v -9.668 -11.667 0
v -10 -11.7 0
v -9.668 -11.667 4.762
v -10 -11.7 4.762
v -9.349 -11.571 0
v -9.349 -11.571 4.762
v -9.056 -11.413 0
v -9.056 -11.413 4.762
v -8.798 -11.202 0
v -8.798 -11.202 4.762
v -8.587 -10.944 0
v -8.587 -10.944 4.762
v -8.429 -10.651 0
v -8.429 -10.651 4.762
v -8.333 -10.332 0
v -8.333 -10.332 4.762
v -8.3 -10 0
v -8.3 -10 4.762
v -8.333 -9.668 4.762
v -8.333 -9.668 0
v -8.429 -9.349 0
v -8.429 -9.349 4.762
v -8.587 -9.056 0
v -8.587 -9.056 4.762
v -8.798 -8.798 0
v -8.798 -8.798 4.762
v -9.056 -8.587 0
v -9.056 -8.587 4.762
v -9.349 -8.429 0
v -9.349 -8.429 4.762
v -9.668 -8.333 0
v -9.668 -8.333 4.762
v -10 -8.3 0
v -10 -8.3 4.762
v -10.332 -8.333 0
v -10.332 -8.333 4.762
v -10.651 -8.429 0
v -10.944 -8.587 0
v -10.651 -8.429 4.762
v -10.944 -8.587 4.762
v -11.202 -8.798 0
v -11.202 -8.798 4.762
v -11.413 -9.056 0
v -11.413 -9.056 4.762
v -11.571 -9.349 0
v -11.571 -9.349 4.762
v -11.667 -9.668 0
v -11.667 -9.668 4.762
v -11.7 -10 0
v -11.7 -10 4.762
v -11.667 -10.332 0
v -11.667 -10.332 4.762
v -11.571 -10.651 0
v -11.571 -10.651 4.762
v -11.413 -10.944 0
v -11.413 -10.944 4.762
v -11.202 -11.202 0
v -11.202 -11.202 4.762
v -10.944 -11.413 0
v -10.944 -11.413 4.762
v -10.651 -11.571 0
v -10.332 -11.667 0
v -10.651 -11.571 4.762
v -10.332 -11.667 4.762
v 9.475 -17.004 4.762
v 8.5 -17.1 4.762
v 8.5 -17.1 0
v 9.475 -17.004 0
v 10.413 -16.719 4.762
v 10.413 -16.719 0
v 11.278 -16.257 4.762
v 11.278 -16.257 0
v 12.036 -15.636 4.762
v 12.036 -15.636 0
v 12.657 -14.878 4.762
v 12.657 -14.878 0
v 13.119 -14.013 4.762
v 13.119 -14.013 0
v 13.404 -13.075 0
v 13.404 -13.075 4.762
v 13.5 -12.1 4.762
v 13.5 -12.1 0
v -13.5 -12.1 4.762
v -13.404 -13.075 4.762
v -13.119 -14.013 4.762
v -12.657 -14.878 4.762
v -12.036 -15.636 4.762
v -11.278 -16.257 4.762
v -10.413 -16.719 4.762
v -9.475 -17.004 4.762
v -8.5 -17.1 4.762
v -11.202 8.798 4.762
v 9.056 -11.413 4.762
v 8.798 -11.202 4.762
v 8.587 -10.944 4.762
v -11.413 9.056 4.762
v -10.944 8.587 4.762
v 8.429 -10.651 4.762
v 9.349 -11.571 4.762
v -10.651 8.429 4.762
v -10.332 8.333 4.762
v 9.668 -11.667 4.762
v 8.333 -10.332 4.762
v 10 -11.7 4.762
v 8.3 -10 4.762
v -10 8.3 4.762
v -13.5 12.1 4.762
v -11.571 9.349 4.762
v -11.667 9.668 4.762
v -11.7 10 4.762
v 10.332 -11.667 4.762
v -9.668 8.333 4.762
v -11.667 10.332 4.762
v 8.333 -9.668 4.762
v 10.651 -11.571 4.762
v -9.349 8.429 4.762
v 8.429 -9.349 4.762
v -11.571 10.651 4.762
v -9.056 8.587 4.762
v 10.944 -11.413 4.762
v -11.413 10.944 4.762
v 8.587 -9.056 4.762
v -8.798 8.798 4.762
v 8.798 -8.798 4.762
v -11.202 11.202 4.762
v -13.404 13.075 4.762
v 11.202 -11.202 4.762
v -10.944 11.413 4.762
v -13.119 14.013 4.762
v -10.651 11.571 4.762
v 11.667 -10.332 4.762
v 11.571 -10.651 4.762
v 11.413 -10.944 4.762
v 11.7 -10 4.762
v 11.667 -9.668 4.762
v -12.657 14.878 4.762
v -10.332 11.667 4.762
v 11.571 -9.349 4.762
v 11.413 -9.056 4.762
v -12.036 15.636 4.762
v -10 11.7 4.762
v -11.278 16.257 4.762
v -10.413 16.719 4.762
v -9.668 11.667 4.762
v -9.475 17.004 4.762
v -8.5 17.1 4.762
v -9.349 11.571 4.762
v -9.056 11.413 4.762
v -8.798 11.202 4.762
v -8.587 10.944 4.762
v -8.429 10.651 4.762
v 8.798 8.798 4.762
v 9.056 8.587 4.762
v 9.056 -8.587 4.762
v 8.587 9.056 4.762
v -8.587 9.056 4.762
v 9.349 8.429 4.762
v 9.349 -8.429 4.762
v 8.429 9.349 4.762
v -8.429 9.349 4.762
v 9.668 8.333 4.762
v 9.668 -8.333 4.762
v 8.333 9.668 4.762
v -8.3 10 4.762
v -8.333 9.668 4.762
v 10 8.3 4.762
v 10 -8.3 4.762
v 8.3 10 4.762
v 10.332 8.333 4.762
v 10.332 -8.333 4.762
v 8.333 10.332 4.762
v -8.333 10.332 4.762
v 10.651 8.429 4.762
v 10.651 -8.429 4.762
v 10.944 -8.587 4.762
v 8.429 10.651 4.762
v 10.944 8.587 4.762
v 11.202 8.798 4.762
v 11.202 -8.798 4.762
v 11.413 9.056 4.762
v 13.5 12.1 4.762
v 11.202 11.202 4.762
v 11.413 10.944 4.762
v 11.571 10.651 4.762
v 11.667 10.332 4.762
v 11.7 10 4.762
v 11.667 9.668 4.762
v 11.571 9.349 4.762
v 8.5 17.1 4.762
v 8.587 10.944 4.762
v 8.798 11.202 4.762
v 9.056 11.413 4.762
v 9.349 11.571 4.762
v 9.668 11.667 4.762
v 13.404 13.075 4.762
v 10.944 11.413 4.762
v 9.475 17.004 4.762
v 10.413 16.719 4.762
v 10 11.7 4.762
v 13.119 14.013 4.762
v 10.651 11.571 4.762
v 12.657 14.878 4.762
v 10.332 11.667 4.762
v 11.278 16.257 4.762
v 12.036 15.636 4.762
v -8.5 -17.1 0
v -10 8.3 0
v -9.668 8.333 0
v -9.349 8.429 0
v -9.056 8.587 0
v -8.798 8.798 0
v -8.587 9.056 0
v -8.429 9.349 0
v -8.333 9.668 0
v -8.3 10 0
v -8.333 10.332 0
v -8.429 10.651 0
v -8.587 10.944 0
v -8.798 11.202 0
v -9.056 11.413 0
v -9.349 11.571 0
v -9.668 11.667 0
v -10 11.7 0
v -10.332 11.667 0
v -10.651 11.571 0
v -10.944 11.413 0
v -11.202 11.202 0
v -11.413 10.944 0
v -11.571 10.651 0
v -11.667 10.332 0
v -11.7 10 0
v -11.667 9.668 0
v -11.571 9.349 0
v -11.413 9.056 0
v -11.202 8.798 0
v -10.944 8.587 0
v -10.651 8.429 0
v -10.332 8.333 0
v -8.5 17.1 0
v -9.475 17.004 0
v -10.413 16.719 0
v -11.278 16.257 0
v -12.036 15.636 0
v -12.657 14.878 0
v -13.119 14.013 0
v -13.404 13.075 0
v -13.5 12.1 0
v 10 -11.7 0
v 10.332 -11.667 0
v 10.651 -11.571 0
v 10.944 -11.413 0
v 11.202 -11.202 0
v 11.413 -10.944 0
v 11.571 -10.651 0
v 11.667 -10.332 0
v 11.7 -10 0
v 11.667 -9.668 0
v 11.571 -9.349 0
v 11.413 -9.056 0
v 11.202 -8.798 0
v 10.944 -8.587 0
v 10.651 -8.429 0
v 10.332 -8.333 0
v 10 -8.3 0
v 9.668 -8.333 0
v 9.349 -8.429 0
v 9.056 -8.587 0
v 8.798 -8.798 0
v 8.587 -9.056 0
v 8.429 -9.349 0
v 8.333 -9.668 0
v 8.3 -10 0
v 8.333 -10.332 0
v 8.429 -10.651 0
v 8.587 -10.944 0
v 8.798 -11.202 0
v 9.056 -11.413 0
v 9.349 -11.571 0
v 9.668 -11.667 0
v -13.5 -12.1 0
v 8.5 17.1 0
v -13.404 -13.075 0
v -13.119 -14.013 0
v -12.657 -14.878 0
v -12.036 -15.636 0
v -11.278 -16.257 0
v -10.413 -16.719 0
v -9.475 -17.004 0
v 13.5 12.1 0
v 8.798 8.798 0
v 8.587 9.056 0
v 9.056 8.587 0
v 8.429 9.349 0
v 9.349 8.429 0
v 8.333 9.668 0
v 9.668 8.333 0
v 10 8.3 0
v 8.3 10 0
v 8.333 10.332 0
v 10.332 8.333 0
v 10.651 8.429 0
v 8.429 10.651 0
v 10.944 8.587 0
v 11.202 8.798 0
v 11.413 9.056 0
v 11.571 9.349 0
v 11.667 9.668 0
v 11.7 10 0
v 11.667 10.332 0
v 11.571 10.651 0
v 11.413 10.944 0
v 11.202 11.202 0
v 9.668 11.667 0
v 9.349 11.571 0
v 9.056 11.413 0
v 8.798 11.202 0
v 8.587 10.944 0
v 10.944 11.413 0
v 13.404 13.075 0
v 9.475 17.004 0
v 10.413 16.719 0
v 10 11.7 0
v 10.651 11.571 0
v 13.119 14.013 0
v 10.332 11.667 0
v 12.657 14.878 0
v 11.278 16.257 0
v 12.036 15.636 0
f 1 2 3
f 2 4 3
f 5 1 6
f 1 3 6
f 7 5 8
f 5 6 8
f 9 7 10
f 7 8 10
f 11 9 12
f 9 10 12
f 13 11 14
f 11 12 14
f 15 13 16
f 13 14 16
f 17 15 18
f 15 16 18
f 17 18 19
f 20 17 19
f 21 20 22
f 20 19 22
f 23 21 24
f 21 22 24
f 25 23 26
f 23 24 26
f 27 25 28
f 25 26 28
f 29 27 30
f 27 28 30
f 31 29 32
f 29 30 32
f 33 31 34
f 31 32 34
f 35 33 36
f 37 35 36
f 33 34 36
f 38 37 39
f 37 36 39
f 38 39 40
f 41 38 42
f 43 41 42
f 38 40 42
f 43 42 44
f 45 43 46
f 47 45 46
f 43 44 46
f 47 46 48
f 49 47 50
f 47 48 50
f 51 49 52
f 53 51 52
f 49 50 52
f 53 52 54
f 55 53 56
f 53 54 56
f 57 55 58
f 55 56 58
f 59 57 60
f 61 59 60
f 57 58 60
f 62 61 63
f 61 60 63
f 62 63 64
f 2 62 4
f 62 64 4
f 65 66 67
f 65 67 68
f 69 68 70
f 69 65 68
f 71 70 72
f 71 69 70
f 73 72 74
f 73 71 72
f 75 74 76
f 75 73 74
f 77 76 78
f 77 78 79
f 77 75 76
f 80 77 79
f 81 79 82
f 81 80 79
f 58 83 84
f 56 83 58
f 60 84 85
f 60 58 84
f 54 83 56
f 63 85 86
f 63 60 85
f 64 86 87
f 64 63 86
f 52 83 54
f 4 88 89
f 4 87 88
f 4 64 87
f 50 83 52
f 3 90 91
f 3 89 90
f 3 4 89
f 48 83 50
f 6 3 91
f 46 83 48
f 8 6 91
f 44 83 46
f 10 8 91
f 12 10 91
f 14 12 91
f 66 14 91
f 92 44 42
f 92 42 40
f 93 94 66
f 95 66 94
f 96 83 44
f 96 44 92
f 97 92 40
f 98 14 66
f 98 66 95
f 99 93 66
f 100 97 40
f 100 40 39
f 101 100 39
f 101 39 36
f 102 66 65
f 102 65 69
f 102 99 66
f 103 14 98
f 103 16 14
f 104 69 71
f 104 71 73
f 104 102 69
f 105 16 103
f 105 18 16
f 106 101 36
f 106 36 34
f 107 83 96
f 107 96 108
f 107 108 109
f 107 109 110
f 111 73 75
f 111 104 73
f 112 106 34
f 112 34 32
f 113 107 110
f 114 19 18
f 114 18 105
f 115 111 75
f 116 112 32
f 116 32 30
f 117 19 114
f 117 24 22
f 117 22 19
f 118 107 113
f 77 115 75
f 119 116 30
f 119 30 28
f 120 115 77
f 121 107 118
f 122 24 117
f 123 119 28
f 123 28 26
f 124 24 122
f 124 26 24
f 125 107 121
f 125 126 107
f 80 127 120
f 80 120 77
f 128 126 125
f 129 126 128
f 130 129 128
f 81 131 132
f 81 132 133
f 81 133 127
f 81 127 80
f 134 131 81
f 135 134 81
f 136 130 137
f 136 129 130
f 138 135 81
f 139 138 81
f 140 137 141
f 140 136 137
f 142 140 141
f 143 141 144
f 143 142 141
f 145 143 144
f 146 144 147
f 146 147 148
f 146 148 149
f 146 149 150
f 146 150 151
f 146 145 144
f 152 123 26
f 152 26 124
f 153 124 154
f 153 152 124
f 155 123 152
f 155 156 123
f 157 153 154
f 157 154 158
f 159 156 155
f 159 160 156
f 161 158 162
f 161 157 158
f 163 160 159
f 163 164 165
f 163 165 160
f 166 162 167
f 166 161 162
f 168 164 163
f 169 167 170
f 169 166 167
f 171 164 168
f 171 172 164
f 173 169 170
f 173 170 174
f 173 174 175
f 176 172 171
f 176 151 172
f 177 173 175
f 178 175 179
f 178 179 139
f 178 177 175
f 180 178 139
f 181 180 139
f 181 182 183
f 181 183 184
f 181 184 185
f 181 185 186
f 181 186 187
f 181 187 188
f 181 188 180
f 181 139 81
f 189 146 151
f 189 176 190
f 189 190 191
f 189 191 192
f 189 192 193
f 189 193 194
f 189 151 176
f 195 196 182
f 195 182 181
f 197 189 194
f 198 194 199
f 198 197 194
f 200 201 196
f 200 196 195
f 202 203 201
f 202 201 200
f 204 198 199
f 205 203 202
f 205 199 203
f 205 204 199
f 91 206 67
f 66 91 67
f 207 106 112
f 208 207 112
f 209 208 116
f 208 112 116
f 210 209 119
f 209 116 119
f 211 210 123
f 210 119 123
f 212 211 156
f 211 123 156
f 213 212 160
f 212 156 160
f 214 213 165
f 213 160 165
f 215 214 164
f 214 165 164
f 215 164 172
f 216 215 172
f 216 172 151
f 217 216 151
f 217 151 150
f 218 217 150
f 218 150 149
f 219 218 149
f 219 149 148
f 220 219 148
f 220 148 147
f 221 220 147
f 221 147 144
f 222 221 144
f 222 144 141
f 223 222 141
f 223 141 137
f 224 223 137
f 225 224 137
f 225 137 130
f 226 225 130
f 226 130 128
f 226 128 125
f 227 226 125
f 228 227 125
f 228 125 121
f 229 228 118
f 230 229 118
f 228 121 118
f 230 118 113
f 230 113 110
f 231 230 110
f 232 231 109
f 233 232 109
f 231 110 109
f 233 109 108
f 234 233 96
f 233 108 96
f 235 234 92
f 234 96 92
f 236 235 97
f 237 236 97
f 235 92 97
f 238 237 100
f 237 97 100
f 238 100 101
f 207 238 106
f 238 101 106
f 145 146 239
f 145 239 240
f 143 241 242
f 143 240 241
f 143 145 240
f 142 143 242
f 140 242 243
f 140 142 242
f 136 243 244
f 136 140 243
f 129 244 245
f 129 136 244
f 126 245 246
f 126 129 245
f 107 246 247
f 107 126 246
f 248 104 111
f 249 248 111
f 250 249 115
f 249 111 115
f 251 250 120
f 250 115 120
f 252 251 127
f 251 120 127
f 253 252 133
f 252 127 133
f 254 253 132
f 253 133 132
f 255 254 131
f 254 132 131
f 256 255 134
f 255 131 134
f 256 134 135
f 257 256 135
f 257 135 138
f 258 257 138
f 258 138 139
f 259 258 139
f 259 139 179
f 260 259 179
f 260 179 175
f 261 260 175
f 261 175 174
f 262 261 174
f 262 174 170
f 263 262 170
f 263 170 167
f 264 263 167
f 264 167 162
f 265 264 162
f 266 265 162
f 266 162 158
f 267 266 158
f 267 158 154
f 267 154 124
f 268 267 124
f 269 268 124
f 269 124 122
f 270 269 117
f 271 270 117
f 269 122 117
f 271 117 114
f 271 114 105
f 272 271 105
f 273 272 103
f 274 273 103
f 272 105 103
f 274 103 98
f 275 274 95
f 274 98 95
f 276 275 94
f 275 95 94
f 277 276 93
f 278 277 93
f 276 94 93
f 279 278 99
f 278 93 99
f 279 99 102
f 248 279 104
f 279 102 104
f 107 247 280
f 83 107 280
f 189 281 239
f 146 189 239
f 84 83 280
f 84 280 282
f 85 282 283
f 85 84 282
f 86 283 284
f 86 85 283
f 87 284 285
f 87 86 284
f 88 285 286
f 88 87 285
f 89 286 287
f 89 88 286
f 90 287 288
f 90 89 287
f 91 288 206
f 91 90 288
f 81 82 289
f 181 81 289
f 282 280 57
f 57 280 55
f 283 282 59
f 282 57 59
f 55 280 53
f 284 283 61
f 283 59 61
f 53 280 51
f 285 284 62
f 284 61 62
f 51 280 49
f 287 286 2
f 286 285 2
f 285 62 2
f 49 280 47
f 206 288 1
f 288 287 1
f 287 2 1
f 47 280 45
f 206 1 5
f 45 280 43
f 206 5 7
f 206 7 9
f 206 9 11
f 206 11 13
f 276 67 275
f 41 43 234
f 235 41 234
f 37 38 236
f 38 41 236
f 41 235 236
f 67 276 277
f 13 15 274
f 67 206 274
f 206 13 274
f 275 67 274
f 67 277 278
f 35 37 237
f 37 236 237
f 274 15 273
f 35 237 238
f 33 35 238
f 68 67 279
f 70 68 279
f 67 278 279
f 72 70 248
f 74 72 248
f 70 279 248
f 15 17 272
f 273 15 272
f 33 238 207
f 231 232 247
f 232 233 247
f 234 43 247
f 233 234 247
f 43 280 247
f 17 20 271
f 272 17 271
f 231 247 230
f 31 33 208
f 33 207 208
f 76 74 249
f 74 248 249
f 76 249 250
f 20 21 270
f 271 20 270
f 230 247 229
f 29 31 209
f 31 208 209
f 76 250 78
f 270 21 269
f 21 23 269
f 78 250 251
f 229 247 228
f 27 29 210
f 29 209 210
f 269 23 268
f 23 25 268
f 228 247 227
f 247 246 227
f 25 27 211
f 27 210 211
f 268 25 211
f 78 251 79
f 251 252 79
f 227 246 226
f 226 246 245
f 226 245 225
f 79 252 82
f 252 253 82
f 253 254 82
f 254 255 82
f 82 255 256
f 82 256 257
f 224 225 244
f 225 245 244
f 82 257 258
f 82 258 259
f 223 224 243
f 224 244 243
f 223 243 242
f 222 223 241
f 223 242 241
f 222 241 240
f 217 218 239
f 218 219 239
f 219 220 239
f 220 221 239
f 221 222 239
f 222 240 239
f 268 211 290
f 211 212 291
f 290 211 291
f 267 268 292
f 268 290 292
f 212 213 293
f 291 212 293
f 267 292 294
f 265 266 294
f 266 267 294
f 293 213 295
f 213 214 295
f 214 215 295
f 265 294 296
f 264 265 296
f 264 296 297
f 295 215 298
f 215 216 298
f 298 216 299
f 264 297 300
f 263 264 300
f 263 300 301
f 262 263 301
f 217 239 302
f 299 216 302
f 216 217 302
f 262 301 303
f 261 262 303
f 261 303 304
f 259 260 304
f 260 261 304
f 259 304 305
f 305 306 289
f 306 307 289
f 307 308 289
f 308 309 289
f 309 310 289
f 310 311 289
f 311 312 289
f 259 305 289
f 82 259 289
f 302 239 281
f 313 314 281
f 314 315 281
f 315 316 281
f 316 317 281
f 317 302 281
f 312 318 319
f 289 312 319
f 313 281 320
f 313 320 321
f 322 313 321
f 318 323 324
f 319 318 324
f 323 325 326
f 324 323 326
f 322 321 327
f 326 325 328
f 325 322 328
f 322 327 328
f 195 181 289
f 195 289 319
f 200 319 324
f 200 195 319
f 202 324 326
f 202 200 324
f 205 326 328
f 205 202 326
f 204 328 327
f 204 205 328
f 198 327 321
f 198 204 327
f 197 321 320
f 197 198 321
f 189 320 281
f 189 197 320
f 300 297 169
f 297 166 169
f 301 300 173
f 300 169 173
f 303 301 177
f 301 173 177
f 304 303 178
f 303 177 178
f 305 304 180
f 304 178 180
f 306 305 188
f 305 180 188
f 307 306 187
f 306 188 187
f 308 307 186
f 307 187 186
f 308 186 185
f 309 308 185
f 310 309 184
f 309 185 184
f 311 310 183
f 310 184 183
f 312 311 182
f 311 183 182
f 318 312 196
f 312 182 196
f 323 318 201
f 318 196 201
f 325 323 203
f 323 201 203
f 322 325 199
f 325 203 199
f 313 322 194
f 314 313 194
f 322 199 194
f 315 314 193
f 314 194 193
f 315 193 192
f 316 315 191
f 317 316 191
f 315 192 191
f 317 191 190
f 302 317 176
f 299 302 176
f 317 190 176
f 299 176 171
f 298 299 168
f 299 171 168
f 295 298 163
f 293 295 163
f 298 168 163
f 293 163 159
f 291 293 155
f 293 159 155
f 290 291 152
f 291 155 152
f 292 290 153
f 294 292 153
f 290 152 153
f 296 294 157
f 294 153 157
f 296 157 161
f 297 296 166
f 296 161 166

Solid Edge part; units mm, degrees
sketch "Sketch1" plane through (0, 0, 0) normal (0, 0, 1) x (1, 0, 0)
  line L0 (-13.5, -17.1) -> (13.5, -17.1)
  line L1 (13.5, -17.1) -> (13.5, 17.1)
  line L2 (13.5, 17.1) -> (-13.5, 17.1)
  line L3 (-13.5, 17.1) -> (-13.5, -17.1)
  dimension "D1" = 20
  dimension "D2" = 34.2
  dimension "D3" = 27
extrude "Protrusion1" add sketch "Sketch1" along normal blind 4.7625
hole "Hole_1" at (-10, 10, 4.7625) direction (0, 0, -1) diameter 3.4 end up to next
pattern_linear "Pattern1" count 2 spacing 20 along (1, 0, 0) count 2 spacing 20 along (0, -1, 0) of "Hole_1"
fillet "Round_1" radius 5 4 edges at (-13.5, -17.1, 2.3812) (13.5, -17.1, 2.3812) (13.5, 17.1, 2.3812) (-13.5, 17.1, 2.3812)
properties material "Aluminum, 6061-T6"
